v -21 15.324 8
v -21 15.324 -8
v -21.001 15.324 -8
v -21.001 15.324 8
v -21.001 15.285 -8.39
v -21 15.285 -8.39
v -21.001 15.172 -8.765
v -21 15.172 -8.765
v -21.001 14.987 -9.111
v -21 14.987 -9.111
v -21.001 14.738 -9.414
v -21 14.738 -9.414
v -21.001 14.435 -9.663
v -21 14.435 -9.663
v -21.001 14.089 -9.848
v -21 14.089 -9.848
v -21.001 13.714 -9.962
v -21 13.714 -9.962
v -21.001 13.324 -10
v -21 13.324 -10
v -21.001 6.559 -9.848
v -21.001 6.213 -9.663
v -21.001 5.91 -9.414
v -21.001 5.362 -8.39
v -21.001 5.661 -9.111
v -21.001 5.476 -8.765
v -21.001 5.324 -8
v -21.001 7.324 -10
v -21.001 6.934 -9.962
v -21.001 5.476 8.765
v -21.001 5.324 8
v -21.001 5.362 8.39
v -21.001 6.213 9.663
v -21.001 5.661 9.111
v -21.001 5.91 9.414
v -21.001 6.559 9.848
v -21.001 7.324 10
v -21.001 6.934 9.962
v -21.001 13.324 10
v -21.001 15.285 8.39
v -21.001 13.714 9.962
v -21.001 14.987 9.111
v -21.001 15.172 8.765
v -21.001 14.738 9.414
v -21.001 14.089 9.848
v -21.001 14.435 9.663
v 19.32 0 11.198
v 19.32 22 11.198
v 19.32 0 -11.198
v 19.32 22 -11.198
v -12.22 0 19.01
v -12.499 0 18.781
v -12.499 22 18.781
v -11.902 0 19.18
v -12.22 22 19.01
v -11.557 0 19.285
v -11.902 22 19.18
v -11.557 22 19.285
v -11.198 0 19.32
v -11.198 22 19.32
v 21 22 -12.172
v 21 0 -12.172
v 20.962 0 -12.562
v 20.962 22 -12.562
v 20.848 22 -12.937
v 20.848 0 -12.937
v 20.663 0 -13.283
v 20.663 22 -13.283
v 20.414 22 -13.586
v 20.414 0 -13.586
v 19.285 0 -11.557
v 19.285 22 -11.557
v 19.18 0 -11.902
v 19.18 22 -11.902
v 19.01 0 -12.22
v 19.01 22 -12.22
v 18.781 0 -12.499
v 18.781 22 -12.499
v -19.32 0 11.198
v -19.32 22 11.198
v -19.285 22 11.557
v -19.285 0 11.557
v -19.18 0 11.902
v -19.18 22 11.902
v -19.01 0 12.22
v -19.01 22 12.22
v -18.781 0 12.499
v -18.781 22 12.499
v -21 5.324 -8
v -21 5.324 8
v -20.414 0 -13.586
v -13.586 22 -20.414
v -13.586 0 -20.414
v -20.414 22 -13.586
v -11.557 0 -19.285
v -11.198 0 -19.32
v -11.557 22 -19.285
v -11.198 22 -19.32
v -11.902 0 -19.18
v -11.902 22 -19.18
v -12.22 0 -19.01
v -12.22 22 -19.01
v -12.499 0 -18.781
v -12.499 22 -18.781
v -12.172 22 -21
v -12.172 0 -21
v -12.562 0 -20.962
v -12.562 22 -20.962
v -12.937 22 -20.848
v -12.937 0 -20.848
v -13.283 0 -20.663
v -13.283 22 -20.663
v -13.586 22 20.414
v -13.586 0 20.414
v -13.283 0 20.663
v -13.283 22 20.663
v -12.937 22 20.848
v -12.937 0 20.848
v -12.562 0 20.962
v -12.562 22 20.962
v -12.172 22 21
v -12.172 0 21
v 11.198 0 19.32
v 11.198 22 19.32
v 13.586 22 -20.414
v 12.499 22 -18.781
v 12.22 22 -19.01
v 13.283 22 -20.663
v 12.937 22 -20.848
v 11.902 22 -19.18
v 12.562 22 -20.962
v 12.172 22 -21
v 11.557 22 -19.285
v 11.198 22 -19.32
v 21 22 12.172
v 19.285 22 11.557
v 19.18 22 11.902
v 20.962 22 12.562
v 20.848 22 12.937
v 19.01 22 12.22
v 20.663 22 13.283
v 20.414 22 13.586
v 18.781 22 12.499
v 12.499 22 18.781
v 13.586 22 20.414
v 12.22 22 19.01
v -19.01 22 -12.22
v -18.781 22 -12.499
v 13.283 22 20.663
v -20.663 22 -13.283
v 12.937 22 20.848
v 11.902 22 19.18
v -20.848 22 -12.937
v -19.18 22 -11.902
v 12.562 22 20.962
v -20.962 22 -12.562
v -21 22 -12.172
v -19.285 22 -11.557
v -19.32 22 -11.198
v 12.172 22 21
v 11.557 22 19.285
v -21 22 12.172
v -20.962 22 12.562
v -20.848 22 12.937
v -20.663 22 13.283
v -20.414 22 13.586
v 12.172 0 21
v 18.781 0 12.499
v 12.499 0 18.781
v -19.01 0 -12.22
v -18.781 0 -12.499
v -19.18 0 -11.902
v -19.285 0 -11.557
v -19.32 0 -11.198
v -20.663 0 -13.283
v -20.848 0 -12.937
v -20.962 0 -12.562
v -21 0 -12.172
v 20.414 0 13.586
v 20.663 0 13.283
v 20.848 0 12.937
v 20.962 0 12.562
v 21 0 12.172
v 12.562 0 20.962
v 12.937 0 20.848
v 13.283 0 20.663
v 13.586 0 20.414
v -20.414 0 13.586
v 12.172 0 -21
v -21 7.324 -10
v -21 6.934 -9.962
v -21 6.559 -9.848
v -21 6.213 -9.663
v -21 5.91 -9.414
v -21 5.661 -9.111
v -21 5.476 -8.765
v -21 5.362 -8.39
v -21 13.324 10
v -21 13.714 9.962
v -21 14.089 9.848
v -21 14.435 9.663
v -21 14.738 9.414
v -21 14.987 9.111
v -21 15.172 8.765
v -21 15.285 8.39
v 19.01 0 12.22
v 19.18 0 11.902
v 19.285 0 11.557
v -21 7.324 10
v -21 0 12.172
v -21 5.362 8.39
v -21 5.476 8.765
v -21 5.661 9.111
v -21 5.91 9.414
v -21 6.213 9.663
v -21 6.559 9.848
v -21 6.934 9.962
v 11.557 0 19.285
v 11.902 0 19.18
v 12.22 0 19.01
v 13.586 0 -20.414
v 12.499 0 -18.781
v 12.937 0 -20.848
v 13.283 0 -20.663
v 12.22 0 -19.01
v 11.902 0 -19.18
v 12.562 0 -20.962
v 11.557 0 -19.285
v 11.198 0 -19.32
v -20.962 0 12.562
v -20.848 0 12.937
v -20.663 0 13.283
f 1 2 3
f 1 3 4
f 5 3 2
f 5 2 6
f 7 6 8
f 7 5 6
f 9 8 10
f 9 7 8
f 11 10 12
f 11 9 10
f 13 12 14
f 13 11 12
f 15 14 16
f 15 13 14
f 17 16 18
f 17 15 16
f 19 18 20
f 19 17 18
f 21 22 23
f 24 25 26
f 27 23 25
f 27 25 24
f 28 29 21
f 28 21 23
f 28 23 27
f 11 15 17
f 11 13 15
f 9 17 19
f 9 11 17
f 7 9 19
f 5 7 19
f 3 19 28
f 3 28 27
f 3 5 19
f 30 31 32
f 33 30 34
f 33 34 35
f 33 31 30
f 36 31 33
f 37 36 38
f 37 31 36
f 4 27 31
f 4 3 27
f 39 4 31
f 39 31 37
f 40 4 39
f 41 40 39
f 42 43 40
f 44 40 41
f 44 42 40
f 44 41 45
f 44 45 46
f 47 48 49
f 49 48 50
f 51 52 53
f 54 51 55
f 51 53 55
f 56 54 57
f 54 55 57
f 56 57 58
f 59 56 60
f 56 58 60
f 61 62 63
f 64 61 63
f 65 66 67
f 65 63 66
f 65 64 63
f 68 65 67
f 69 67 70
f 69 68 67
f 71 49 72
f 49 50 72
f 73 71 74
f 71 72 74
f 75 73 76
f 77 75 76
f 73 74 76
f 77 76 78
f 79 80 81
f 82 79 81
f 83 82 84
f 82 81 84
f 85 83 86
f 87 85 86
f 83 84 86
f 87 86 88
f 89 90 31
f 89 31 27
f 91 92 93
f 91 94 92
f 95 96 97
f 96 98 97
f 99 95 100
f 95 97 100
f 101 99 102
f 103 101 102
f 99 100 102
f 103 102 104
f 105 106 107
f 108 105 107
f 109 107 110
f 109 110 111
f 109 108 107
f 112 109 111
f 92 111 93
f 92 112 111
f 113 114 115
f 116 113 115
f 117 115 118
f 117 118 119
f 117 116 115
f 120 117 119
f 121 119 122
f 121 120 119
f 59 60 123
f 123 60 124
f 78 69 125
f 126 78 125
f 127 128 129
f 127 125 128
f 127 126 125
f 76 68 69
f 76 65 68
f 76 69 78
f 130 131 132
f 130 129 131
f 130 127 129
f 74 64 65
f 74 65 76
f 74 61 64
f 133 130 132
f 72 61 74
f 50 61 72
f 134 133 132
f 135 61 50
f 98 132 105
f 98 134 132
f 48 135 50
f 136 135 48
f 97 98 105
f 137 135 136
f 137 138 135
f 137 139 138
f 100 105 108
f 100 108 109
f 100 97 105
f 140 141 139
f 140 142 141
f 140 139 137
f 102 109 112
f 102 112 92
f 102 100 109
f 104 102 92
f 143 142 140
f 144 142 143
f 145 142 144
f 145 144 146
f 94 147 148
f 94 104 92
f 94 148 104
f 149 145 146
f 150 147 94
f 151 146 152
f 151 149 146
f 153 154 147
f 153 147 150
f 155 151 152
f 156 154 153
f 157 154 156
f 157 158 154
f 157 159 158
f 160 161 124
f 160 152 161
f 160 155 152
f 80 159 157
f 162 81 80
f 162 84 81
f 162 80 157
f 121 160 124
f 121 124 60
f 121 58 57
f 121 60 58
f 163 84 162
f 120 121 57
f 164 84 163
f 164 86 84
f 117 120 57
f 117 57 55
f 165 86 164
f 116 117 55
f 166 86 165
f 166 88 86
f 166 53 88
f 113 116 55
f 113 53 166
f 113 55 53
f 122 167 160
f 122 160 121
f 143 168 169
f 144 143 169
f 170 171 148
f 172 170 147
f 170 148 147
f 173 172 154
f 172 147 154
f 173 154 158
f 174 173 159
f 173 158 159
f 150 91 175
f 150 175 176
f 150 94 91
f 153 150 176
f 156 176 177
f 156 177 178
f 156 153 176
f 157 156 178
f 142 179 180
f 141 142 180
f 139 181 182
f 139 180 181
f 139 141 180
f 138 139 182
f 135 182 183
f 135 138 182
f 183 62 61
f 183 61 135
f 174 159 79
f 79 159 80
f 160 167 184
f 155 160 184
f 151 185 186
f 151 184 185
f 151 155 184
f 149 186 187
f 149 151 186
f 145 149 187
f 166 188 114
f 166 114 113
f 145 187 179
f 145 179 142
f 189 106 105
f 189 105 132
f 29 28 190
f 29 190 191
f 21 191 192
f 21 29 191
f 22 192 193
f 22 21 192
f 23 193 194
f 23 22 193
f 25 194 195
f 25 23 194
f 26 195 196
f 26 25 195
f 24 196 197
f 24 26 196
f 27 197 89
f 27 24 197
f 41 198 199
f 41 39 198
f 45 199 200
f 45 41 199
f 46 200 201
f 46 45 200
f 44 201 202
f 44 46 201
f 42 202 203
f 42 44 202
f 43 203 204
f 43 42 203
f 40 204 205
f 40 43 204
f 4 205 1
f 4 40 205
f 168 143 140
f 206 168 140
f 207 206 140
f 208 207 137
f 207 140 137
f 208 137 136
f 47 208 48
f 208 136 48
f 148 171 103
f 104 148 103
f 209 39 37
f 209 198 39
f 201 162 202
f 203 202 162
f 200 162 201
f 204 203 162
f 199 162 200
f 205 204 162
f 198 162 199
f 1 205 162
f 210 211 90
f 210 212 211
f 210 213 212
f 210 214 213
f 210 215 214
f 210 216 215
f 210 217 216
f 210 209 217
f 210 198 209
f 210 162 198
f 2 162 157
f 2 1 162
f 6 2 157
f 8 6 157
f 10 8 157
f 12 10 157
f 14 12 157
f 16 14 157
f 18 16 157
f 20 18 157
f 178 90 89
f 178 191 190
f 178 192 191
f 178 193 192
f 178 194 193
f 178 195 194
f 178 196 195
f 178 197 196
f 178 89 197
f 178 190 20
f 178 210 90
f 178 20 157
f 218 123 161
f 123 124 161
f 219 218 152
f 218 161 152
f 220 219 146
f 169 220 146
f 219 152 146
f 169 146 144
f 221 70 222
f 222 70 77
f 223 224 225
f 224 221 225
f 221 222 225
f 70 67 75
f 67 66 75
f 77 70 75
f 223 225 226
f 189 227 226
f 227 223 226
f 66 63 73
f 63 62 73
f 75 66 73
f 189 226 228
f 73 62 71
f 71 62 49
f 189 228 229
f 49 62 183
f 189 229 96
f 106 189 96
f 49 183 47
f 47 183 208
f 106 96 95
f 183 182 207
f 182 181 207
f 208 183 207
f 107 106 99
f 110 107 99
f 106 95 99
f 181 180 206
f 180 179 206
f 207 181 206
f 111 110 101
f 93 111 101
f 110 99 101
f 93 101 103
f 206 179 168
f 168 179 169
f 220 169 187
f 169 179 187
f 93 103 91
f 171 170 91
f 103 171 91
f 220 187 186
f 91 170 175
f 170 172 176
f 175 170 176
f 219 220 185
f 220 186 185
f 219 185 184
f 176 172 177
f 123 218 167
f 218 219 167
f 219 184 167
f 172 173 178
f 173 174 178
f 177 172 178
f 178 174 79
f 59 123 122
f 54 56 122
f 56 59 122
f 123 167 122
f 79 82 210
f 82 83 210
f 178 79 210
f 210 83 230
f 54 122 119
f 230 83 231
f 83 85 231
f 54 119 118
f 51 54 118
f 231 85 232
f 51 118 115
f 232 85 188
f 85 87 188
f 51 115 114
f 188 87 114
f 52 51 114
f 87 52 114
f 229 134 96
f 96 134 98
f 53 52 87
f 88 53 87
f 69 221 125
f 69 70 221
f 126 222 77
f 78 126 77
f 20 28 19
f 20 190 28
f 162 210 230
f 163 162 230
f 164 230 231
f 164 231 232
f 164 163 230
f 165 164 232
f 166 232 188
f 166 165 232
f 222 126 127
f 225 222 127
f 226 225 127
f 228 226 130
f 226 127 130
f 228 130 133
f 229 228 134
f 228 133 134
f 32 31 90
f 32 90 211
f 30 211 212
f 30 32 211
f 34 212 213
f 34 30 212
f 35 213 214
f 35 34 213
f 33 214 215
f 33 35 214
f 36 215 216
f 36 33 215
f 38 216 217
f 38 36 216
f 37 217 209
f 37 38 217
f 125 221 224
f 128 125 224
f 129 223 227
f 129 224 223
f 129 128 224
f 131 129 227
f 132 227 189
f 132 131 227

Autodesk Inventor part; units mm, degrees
ref_plane "YZ Plane" through (0, 0, 0) normal (1, 0, 0) x (0, 1, 0)
ref_plane "XZ Plane" through (0, 0, 0) normal (0, 1, 0) x (-1, 0, 0)
ref_plane "XY Plane" through (0, 0, 0) normal (0, 0, 1) x (1, 0, 0)
sketch "Sketch1" plane through (0, 0, 0) normal (0, 1, 0) x (-1, 0, 0)
  line L0 (21, -21) -> (-21, -21)
  line L1 (-21, -21) -> (-21, 21)
  line L2 (-21, 21) -> (21, 21)
  line L3 (21, 21) -> (21, -21)
  line L4 (21, -21) -> (-21, 21) construction
  line L5 (-21, -21) -> (21, 21) construction
  point P0 (0, 0)
  dimension "d0" = 42
  dimension "d1" = 42
extrude "Extrusion1" add sketch "Sketch1" along normal blind 22
chamfer "Chamfer1" distance 8 angle 45 4 edges at (21, 11, 21) (-21, 11, 21) (-21, 11, -21) (21, 11, -21)
fillet "Fillet1" radius 2 8 edges at (-13, 11, -21) (-21, 11, -13) (-21, 11, 13) (-13, 11, 21) (13, 11, 21) (21, 11, 13) (13, 11, -21) (21, 11, -13)
sketch "Sketch4" plane through (0, 22, 0) normal (0, 1, 0) x (1, 0, 0)
  arc A0 (21, 12.1716) -> (20.4142, 13.5858) centre (19, 12.1716) ccw projected
  line L0 (13.5858, 20.4142) -> (20.4142, 13.5858) projected
  arc A1 (13.5858, 20.4142) -> (12.1716, 21) centre (12.1716, 19) ccw projected
  line L1 (12.1716, 21) -> (-12.1716, 21) projected
  arc A2 (-12.1716, 21) -> (-13.5858, 20.4142) centre (-12.1716, 19) ccw projected
  line L2 (-20.4142, 13.5858) -> (-13.5858, 20.4142) projected
  arc A3 (-20.4142, 13.5858) -> (-21, 12.1716) centre (-19, 12.1716) ccw projected
  line L3 (-21, 12.1716) -> (-21, -12.1716) projected
  arc A4 (-21, -12.1716) -> (-20.4142, -13.5858) centre (-19, -12.1716) ccw projected
  line L4 (-13.5858, -20.4142) -> (-20.4142, -13.5858) projected
  arc A5 (-13.5858, -20.4142) -> (-12.1716, -21) centre (-12.1716, -19) ccw projected
  line L5 (-12.1716, -21) -> (12.1716, -21) projected
  arc A6 (12.1716, -21) -> (13.5858, -20.4142) centre (12.1716, -19) ccw projected
  line L6 (20.4142, -13.5858) -> (13.5858, -20.4142) projected
  arc A7 (20.4142, -13.5858) -> (21, -12.1716) centre (19, -12.1716) ccw projected
  line L7 (21, -12.1716) -> (21, 12.1716) projected
  arc A8 (19.32, 11.1978) -> (18.7811, 12.4989) centre (17.48, 11.1978) ccw
  line L8 (12.4989, 18.7811) -> (18.7811, 12.4989)
  arc A9 (12.4989, 18.7811) -> (11.1978, 19.32) centre (11.1978, 17.48) ccw
  line L9 (11.1978, 19.32) -> (-11.1978, 19.32)
  arc A10 (-11.1978, 19.32) -> (-12.4989, 18.7811) centre (-11.1978, 17.48) ccw
  line L10 (-18.7811, 12.4989) -> (-12.4989, 18.7811)
  arc A11 (-18.7811, 12.4989) -> (-19.32, 11.1978) centre (-17.48, 11.1978) ccw
  line L11 (-19.32, 11.1978) -> (-19.32, -11.1978)
  arc A12 (-19.32, -11.1978) -> (-18.7811, -12.4989) centre (-17.48, -11.1978) ccw
  line L12 (-12.4989, -18.7811) -> (-18.7811, -12.4989)
  arc A13 (-12.4989, -18.7811) -> (-11.1978, -19.32) centre (-11.1978, -17.48) ccw
  line L13 (-11.1978, -19.32) -> (11.1978, -19.32)
  arc A14 (11.1978, -19.32) -> (12.4989, -18.7811) centre (11.1978, -17.48) ccw
  line L14 (18.7811, -12.4989) -> (12.4989, -18.7811)
  arc A15 (18.7811, -12.4989) -> (19.32, -11.1978) centre (17.48, -11.1978) ccw
  line L15 (19.32, -11.1978) -> (19.32, 11.1978)
  point P0 (0, 0)
  point P1 (0, 0)
extrude "Extrusion2" cut sketch "Sketch4" against normal up to surface (22 mm away) contours L15 A15 L14 A14 L13 A13 L12 A12 L11 A11 L10 A10 L9 A9 L8 A8
sketch "Sketch5" plane through (-21, 0, -12.1716) normal (-1, 0, 0) x (0, 0, 1)
  line L0 (2.1716, 15.3239) -> (22.1716, 15.3239)
  line L1 (22.1716, 15.3239) -> (22.1716, 5.3239)
  line L2 (22.1716, 5.3239) -> (2.1716, 5.3239)
  line L3 (2.1716, 5.3239) -> (2.1716, 15.3239)
  line L4 (2.1716, 15.3239) -> (22.1716, 5.3239) construction
  line L5 (22.1716, 15.3239) -> (2.1716, 5.3239) construction
  point P0 (12.1716, 0)
  point P1 (12.1716, 10.3239)
  dimension "d18" = 20
  dimension "d19" = 10
  dimension "d20" = 10
extrude "Extrusion3" add sketch "Sketch5" along normal blind 0.001
sketch "Sketch6" plane through (-21.001, 0, -12.1716) normal (-1, 0, 0) x (0, 0, 1)
  line L0 (2.7184, 14.6945) -> (21.7293, 14.6945) construction
  line L1 (21.7293, 14.6945) -> (21.7293, 6.3236) construction
  line L2 (21.7293, 6.3236) -> (2.7184, 6.3236) construction
  line L3 (2.7184, 6.3236) -> (2.7184, 14.6945) construction
  point P0 (12.1716, 0)
fillet "Fillet2" radius 2 4 edges at (-21.0005, 15.3239, -10) (-21.0005, 5.3239, -10) (-21.0005, 5.3239, 10) (-21.0005, 15.3239, 10)
